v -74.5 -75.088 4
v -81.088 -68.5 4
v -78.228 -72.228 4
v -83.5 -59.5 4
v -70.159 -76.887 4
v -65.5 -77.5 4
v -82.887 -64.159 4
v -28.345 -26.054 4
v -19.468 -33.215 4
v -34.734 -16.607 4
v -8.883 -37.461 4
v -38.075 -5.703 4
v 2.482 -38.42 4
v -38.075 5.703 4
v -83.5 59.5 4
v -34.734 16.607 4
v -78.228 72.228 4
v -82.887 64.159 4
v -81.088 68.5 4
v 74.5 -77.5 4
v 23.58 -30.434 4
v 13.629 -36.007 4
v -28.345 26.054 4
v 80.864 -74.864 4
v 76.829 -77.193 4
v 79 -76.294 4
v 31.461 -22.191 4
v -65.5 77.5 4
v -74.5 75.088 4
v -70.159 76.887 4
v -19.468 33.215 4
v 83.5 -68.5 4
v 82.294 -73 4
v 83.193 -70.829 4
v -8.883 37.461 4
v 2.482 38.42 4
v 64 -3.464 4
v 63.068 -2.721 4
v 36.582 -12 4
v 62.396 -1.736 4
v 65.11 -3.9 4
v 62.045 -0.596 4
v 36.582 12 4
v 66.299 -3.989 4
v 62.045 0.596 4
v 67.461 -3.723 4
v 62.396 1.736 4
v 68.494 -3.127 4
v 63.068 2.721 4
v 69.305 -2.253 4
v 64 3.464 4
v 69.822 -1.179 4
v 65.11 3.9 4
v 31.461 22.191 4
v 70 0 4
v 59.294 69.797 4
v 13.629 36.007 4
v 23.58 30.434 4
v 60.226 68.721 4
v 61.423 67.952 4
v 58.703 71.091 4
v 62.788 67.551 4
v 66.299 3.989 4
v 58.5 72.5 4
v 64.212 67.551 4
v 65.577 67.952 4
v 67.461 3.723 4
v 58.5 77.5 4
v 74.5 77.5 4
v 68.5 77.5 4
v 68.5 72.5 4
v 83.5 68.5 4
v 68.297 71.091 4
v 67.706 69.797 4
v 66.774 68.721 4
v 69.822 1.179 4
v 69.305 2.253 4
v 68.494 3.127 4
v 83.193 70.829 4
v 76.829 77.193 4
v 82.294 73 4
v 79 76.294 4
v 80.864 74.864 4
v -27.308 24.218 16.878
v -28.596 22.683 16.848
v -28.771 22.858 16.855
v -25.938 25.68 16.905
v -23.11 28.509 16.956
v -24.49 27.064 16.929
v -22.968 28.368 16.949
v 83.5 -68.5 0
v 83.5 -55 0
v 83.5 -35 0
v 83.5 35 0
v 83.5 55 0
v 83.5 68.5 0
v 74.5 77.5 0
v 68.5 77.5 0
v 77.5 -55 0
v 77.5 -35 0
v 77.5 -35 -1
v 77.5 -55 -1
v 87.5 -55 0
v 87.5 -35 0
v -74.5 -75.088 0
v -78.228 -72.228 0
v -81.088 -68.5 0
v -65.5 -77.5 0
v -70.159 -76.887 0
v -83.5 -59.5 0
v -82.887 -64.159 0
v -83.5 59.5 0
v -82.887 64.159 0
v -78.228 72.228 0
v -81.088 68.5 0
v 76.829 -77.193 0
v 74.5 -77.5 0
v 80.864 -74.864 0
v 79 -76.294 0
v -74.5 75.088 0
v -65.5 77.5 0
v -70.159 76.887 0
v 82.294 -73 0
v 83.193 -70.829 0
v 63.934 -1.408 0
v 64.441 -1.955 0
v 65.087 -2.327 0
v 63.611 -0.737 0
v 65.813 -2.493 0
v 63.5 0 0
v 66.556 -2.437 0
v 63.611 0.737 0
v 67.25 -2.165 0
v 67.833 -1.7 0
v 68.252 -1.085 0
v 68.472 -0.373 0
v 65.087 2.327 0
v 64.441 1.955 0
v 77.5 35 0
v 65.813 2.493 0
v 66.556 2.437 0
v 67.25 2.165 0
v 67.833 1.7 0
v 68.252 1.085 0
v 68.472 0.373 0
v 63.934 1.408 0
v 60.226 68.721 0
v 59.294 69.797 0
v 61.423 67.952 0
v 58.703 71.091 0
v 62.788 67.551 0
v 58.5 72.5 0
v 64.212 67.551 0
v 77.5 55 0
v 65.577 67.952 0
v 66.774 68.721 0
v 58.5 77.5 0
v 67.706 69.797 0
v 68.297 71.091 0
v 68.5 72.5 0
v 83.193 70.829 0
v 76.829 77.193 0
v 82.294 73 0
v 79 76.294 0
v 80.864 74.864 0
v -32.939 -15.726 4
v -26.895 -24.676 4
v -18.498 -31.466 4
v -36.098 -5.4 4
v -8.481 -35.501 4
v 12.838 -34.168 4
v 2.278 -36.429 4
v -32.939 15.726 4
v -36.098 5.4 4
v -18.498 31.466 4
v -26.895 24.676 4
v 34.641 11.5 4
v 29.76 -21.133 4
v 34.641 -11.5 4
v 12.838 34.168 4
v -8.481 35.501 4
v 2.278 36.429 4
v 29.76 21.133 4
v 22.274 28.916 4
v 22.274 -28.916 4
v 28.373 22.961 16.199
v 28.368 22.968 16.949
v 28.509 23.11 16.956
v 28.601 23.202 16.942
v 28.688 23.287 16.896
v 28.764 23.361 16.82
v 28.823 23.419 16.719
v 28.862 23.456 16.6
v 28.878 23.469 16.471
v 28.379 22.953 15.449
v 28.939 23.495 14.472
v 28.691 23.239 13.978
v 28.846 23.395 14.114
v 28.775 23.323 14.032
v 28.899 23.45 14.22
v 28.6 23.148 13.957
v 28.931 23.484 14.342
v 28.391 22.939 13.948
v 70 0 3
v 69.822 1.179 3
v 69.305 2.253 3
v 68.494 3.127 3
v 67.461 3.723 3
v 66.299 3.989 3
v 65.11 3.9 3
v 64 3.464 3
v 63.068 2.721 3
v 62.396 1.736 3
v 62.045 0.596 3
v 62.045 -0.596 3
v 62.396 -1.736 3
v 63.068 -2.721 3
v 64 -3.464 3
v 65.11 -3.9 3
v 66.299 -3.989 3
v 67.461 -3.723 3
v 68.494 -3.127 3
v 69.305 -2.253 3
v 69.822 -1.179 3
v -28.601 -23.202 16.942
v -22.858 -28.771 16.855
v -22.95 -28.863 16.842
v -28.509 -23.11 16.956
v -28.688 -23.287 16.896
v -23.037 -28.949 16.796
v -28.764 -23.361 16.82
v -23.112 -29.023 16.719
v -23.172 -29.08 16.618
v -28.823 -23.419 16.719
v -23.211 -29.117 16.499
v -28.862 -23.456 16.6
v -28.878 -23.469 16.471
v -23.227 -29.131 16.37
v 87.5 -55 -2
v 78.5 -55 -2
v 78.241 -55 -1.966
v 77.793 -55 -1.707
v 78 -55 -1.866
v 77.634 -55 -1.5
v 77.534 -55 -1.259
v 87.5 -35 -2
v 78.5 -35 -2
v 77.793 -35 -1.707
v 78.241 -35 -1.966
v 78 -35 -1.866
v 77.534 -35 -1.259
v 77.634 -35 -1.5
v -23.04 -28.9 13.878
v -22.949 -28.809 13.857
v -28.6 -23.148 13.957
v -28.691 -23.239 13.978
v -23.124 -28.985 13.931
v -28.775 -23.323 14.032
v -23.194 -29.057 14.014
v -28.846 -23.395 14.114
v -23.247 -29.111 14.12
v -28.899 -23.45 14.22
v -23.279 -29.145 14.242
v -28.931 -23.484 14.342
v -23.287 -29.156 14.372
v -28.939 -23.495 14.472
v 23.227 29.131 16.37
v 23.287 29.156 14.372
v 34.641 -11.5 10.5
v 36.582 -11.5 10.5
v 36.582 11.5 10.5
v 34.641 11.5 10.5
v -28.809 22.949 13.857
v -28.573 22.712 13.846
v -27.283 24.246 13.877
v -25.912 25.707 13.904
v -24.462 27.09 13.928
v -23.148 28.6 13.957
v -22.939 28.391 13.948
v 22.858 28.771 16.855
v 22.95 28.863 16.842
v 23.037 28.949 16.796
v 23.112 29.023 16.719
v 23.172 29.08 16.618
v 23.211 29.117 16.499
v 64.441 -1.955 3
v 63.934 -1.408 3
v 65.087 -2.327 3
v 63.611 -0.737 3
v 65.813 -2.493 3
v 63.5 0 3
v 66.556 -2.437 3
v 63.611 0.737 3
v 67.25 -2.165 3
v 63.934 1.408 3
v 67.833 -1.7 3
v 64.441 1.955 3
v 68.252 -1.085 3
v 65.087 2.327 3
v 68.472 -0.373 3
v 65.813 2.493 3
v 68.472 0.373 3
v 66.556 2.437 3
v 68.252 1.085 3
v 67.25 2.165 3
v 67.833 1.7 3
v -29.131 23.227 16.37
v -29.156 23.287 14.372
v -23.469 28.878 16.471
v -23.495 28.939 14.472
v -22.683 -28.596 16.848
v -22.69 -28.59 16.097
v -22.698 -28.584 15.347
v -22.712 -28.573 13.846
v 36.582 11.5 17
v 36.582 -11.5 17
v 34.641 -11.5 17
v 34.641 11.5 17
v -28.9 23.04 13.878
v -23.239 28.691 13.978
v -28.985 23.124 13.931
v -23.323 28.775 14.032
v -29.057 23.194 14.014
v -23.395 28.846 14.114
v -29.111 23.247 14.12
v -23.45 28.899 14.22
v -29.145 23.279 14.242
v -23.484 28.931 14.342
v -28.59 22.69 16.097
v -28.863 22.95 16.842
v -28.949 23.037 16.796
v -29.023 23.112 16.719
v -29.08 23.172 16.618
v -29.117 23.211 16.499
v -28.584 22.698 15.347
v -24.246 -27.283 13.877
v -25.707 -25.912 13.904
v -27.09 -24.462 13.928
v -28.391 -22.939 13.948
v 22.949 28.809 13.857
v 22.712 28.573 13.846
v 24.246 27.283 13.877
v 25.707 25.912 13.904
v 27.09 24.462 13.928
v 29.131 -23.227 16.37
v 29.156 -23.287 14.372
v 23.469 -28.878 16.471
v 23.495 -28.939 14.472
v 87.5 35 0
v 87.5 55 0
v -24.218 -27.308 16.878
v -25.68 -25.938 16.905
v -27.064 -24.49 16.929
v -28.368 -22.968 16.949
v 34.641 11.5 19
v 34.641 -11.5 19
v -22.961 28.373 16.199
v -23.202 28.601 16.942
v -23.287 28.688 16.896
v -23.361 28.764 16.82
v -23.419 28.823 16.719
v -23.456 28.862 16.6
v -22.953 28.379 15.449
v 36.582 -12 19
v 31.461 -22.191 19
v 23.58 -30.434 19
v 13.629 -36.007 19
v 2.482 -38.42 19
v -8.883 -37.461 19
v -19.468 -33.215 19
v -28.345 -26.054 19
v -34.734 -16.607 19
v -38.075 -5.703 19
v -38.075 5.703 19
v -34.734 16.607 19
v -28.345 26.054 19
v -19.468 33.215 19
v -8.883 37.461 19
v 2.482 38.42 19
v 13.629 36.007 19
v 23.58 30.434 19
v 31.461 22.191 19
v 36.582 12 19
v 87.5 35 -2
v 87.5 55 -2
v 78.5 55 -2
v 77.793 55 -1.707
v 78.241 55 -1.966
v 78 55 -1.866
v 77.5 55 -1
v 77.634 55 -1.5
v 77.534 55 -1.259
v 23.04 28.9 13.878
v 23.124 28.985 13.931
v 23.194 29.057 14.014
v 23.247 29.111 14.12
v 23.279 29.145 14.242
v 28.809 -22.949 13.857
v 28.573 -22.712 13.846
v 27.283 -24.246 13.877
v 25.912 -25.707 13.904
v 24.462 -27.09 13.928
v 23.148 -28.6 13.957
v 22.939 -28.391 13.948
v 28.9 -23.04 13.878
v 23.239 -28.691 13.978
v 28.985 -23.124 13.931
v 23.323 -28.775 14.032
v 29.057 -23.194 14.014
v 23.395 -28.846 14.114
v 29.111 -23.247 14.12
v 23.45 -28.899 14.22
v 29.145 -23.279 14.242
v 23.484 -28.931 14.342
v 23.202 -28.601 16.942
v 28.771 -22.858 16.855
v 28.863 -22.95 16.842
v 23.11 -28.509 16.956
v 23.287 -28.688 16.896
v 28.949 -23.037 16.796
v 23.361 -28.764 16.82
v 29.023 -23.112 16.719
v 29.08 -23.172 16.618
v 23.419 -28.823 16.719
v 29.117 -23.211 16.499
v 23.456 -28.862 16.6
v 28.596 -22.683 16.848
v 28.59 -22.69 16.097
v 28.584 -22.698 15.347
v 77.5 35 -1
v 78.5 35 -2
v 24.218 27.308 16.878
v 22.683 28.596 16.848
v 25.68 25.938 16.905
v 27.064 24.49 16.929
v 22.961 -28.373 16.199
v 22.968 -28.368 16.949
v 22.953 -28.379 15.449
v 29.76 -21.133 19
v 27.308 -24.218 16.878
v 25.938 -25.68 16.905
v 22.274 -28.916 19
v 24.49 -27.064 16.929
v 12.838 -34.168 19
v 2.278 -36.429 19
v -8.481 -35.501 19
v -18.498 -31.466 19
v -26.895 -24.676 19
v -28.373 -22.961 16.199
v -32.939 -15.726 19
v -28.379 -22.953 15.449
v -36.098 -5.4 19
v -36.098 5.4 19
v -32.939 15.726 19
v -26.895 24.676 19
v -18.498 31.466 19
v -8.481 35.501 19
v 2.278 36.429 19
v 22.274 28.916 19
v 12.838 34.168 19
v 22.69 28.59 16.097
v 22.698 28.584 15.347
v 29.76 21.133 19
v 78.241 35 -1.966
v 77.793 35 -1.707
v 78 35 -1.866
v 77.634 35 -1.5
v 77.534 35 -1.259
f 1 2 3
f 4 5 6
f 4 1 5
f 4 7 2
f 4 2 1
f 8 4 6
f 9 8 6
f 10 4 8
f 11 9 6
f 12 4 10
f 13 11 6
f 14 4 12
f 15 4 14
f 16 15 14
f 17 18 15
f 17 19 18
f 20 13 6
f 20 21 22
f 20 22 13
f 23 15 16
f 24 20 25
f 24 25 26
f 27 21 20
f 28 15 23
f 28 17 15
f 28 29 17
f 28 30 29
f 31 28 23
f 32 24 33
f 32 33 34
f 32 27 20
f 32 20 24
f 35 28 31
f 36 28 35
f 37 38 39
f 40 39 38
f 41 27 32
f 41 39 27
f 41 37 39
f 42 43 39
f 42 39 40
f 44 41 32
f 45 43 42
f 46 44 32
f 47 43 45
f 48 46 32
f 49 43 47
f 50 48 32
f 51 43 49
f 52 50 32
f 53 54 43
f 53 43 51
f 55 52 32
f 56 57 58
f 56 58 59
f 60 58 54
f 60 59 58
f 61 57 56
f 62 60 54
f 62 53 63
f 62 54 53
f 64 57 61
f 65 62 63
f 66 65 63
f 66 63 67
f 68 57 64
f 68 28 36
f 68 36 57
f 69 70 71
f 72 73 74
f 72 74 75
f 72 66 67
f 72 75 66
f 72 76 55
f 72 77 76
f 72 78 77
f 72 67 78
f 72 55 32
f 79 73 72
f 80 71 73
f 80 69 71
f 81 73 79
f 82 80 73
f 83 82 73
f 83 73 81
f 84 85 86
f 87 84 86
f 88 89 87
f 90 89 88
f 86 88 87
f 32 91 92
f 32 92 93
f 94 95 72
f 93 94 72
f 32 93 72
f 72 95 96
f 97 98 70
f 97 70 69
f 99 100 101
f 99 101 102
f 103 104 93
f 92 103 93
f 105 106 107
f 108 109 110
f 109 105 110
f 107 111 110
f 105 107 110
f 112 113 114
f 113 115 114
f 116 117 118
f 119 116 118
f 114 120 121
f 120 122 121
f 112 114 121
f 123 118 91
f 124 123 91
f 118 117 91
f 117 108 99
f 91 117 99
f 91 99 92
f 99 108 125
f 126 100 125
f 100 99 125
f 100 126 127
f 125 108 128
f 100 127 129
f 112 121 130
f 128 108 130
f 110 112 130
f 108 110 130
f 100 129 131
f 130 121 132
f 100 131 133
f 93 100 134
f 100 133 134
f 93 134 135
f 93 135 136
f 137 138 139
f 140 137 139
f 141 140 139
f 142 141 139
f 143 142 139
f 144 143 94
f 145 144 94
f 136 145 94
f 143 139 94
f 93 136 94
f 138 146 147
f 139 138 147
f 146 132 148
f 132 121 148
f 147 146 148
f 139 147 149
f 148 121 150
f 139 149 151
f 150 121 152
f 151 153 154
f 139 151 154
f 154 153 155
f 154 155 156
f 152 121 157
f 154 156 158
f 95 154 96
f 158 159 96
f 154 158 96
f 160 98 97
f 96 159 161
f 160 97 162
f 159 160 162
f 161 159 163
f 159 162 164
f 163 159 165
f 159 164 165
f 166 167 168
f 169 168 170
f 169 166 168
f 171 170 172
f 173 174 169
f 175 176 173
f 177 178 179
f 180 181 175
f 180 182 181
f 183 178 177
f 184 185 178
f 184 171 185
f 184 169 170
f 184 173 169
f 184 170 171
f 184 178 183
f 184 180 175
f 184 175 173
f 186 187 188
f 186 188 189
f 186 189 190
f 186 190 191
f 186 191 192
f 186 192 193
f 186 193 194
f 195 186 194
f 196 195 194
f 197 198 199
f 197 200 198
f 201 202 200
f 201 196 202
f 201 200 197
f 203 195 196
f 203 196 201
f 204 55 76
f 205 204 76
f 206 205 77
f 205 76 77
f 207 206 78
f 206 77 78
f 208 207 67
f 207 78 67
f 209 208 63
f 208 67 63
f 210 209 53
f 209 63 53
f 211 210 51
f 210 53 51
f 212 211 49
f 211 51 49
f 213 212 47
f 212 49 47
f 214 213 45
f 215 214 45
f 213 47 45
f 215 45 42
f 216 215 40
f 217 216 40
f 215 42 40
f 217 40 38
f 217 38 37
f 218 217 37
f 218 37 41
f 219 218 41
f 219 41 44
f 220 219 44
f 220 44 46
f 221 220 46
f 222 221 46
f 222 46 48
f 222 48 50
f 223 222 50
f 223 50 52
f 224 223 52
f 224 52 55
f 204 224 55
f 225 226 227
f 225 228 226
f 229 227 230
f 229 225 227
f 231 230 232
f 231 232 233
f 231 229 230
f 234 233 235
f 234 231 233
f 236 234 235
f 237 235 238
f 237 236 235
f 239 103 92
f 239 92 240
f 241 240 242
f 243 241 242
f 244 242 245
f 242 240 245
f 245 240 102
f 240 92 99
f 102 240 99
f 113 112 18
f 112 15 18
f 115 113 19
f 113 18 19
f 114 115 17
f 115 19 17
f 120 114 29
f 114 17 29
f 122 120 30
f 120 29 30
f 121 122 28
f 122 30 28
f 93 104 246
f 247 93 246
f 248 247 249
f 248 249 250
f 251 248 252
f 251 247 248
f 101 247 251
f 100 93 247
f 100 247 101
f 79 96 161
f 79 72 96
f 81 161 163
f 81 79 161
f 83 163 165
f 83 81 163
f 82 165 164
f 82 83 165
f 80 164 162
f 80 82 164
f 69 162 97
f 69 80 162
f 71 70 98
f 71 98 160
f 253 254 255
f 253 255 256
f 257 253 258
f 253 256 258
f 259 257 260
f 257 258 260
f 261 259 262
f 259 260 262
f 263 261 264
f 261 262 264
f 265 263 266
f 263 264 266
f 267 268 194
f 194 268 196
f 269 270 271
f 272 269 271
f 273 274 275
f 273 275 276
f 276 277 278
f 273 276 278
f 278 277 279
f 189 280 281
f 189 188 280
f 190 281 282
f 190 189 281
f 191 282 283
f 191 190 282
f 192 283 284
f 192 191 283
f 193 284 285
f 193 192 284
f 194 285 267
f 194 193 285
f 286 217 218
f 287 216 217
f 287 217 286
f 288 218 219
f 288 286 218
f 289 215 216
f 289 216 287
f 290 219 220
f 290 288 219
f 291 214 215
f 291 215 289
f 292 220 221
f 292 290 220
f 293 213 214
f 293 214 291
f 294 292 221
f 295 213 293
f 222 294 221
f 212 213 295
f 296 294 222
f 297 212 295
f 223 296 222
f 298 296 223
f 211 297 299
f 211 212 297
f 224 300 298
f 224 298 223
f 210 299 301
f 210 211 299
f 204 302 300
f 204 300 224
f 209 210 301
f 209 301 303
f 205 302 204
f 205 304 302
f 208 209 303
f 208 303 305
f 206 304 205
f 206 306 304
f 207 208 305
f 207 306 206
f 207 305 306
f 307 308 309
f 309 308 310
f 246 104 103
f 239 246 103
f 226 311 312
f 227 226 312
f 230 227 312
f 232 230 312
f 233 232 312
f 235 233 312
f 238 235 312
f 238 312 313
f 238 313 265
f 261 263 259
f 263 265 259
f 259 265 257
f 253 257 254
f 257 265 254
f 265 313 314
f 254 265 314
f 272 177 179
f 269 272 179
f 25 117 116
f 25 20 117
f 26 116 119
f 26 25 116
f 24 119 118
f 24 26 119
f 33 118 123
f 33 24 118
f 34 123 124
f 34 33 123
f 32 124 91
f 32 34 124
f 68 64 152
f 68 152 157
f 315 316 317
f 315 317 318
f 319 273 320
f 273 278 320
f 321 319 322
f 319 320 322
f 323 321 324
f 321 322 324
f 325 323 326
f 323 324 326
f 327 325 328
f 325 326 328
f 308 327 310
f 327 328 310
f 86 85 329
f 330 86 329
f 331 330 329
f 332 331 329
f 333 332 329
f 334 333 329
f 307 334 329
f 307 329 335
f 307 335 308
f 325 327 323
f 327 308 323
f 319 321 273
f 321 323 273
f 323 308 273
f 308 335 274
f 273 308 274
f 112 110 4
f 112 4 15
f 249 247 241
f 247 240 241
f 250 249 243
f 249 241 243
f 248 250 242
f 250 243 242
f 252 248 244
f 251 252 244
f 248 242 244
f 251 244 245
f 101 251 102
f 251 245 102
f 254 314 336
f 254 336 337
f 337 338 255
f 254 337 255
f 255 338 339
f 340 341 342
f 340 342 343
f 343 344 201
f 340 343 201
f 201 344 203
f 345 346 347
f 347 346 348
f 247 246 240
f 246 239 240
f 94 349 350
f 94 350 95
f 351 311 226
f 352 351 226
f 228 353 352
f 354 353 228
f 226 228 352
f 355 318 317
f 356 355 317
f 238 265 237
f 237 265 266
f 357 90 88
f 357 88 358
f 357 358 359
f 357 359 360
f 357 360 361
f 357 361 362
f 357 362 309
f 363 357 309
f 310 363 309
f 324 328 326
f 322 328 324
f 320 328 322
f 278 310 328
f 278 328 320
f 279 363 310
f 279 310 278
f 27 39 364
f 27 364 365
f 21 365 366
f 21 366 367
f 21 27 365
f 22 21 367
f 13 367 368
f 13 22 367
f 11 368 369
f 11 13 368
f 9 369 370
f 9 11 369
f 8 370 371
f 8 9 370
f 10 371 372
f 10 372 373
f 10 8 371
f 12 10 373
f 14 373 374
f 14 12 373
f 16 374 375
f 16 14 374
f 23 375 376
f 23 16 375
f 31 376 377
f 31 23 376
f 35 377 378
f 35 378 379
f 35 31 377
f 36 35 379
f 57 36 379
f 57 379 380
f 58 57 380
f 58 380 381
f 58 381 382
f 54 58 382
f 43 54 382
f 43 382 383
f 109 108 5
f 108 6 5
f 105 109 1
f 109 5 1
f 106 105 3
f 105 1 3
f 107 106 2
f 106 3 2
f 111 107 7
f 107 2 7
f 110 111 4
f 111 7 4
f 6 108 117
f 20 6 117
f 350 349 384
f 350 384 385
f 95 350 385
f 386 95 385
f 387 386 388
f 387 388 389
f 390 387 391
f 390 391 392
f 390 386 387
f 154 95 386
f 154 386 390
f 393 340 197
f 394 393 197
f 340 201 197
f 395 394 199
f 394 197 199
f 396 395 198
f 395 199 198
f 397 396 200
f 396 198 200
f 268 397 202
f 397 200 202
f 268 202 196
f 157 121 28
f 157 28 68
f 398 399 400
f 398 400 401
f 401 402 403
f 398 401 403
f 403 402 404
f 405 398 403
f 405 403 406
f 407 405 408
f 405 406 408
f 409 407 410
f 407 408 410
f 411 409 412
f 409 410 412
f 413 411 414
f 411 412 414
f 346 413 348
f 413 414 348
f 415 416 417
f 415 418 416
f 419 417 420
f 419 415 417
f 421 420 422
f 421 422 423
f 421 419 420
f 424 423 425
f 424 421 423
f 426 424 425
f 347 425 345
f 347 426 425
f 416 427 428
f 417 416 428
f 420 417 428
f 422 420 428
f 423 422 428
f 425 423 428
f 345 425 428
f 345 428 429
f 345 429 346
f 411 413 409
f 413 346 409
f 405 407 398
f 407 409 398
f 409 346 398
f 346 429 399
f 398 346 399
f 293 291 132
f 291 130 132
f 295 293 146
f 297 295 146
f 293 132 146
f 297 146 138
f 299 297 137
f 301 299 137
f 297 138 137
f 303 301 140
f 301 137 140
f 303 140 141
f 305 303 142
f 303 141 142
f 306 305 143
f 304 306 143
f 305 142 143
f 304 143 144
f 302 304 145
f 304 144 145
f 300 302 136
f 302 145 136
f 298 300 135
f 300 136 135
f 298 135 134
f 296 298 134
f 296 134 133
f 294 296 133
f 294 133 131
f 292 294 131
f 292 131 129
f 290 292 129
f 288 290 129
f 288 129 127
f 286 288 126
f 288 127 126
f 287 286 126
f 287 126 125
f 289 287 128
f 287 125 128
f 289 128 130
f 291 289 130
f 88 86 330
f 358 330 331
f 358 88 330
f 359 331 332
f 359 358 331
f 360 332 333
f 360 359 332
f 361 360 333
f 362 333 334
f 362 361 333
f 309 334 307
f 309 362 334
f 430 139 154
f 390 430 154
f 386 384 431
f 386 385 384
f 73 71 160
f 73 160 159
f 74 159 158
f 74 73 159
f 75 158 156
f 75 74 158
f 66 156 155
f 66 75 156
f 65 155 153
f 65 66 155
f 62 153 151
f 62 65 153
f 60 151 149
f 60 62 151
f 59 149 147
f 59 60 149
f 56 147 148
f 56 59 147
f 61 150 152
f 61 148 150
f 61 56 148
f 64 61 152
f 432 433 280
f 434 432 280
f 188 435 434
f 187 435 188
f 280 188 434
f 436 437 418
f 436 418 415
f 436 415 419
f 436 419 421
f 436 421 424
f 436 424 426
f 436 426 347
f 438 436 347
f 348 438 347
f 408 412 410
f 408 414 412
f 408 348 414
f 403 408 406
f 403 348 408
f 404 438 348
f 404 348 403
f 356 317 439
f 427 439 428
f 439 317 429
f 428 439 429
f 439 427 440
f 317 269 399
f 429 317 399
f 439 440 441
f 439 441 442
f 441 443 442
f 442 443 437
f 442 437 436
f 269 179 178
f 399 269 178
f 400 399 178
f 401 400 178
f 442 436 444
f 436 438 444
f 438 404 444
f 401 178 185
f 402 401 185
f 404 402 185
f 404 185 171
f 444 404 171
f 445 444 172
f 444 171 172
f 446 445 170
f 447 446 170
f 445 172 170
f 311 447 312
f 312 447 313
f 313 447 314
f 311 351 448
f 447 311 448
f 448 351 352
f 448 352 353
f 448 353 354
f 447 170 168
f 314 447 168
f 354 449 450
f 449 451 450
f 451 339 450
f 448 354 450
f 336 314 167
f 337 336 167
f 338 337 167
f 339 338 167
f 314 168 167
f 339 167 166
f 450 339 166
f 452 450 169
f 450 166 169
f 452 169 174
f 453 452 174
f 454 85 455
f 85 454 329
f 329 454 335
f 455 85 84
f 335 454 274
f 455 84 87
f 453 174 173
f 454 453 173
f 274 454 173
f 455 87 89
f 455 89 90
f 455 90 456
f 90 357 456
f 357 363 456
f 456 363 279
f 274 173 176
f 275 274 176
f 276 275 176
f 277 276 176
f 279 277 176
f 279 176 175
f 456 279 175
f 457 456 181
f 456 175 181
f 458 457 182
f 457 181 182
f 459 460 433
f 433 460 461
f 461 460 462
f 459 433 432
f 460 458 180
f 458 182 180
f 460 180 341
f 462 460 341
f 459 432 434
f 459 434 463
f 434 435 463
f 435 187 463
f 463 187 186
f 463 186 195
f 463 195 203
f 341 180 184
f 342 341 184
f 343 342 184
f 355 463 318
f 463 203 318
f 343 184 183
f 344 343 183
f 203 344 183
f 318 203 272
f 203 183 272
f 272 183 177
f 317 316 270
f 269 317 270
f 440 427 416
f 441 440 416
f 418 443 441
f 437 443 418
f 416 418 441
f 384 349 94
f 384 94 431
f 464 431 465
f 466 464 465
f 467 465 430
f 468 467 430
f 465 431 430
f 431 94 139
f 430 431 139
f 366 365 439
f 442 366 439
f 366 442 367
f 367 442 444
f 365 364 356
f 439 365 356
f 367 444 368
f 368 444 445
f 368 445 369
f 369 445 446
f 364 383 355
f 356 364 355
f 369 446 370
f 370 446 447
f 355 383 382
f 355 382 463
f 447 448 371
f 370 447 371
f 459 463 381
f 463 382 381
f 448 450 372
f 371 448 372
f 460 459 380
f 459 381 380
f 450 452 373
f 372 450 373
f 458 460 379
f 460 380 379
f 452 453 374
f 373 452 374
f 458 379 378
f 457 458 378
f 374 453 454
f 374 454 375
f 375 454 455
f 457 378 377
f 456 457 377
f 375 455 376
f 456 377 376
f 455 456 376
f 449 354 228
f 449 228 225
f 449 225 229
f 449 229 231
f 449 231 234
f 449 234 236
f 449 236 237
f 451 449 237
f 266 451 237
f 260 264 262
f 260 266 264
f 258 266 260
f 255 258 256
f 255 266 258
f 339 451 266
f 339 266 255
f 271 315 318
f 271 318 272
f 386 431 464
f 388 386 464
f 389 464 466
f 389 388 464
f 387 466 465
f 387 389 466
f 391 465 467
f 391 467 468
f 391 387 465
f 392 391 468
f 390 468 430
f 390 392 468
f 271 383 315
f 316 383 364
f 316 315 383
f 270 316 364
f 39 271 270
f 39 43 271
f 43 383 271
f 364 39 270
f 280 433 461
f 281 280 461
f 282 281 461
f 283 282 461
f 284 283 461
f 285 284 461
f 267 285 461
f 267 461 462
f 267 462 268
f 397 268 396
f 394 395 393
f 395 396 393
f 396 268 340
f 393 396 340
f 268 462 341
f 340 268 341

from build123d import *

# Parameters (mm, degrees)
SKETCH_1_W                       = 167
SKETCH_1_H                       = 155
EXTRUDE_1_DEPTH                  = 4
FILLET_1_R                       = 9
FILLET_2_R                       = 18
CUT_EXTRUDE_1_REACH              = 115.993
HOLE_WIZARD_1_D                  = 5
HOLE_WIZARD_1_CBORE_D            = 8
HOLE_WIZARD_1_CBORE_DEPTH        = 1
EXTRUDE_3_DEPTH                  = 15
CUT_EXTRUDE_2_REACH              = 146.177
SKETCH_13_W                      = 6.5
SKETCH_13_H                      = 23
SKETCH_15_W                      = 8
SKETCH_15_H                      = 3
CUT_EXTRUDE_3_DEPTH              = 2.5
FILLET_3_R                       = 0.5
PATTERN_CIRCULAR_1_COUNT         = 4
FILLET_3_OF_PATTERN_CIRCULAR_1_R = 0.5
SKETCH_18_W                      = 10
SKETCH_18_H                      = 20
EXTRUDE_4_DEPTH                  = 2
FILLET_4_R                       = 1
FILLET_4_OF_MIRROR_1_R           = 1


with BuildPart() as part:
    # ｽｹｯﾁ1 → ﾎﾞｽ - 押し出し1 (new body)
    with BuildSketch(Plane.XY):
        Rectangle(SKETCH_1_W, SKETCH_1_H)
    extrude(amount=EXTRUDE_1_DEPTH)

    # ﾌｨﾚｯﾄ1
    fillet_1_edges = [part.edges().sort_by_distance(p)[0] for p in [
        (83.5, -77.5, 2),
        (83.5, 77.5, 2),
    ]]
    fillet(fillet_1_edges, radius=FILLET_1_R)

    # ﾌｨﾚｯﾄ2
    fillet_2_edges = [part.edges().sort_by_distance(p)[0] for p in [
        (-83.5, -77.5, 2),
        (-83.5, 77.5, 2),
    ]]
    fillet(fillet_2_edges, radius=FILLET_2_R)

    # ｽｹｯﾁ2 → ｶｯﾄ - 押し出し1 (cut, up to next)
    with BuildSketch(Plane.XY.offset(4), mode=Mode.PRIVATE) as cut_extrude_1_sk1:
        with BuildLine():
            Line((58.5, 77.5), (68.5, 77.5))
            Line((68.5, 77.5), (68.5, 72.5))
            ThreePointArc((68.5, 72.5), (63.5, 67.5), (58.5, 72.5))
            Line((58.5, 72.5), (58.5, 77.5))
        make_face()
    cut_extrude_1_tool1 = extrude(cut_extrude_1_sk1.sketch, amount=-CUT_EXTRUDE_1_REACH, mode=Mode.PRIVATE) & part.part
    add(cut_extrude_1_tool1.solids().sort_by_distance((63.5, 72.966749, 4))[0], mode=Mode.SUBTRACT)

    # 穴1 (through all)
    with Locations(Plane.XY.offset(4)):
        with Locations((66, 0)):
            CounterBoreHole(HOLE_WIZARD_1_D / 2, HOLE_WIZARD_1_CBORE_D / 2, HOLE_WIZARD_1_CBORE_DEPTH)

    # ｽｹｯﾁ11 → ﾎﾞｽ - 押し出し3 (add)
    with BuildSketch(Plane.XY.offset(4)):
        with BuildLine():
            Line((36.582099448, 12), (36.582099448, -12))
            ThreePointArc((36.582099448, -12), (-38.5, 0), (36.582099448, 12))
        make_face()
        with BuildLine():
            Line((34.641016151, 11.5), (34.641016151, -11.5))
            ThreePointArc((34.641016151, -11.5), (-36.5, 0), (34.641016151, 11.5))
        make_face(mode=Mode.SUBTRACT)
    extrude(amount=EXTRUDE_3_DEPTH)

    # ｽｹｯﾁ13 → ｶｯﾄ - 押し出し2 (cut, up to next)
    with BuildSketch(Plane(origin=(36.582099448, 0, 0), x_dir=(0, 0, -1), z_dir=(1, 0, 0)), mode=Mode.PRIVATE) as cut_extrude_2_sk1:
        with Locations((-13.75, 0)):
            Rectangle(SKETCH_13_W, SKETCH_13_H)
    cut_extrude_2_tool1 = extrude(cut_extrude_2_sk1.sketch, amount=-CUT_EXTRUDE_2_REACH, mode=Mode.PRIVATE) & part.part
    add(cut_extrude_2_tool1.solids().sort_by_distance((36.582099, 0, 13.75))[0], mode=Mode.SUBTRACT)

    # ｽｹｯﾁ15 → ｶｯﾄ - 押し出し3 (cut)
    with BuildSketch(Plane(origin=(-24.72592031, 24.748737342, 1.062480514), x_dir=(0.7076465964640425, 0.7064548659887622, 0.012562517011201728), z_dir=(-0.7064548659887622, 0.7071067811865462, 0.030356586119027387))):
        with Locations((0, -14.290598152)):
            Rectangle(SKETCH_15_W, SKETCH_15_H)
    cut_extrude_3 = extrude(amount=CUT_EXTRUDE_3_DEPTH, mode=Mode.SUBTRACT)

    # ﾌｨﾚｯﾄ3
    fillet_3_edges = [part.edges().sort_by_distance(p)[0] for p in [
        (-26.293687817, 26.037155642, 16.920446126),
        (-26.331375368, 26.1282254, 13.922065571),
    ]]
    fillet(fillet_3_edges, radius=FILLET_3_R)

    # 円形ﾊﾟﾀｰﾝ1: ｶｯﾄ - 押し出し3 ×4 about axis
    pattern_circular_1_axis = Axis((0, 0, 0), (0, 0, 1))
    for i in range(1, PATTERN_CIRCULAR_1_COUNT):
        add(cut_extrude_3.rotate(pattern_circular_1_axis, i * 360 / PATTERN_CIRCULAR_1_COUNT), mode=Mode.SUBTRACT)

    # ﾌｨﾚｯﾄ3 of 円形ﾊﾟﾀｰﾝ1
    fillet_3_of_pattern_circular_1_edges = [part.edges().sort_by_distance(p)[0] for p in [
        (-26.037155642, -26.293687817, 16.920446126),
        (-26.1282254, -26.331375368, 13.922065571),
        (26.293687817, -26.037155642, 16.920446126),
        (26.331375368, -26.1282254, 13.922065571),
        (26.037155642, 26.293687817, 16.920446126),
        (26.1282254, 26.331375368, 13.922065571),
    ]]
    fillet(fillet_3_of_pattern_circular_1_edges, radius=FILLET_3_OF_PATTERN_CIRCULAR_1_R)

    # ｽｹｯﾁ18 → ﾎﾞｽ - 押し出し4 (add)
    with BuildSketch(Plane(origin=(0, 0, 0), x_dir=(-1, 0, 0), z_dir=(0, 0, -1))):
        with Locations((-82.5, 45)):
            Rectangle(SKETCH_18_W, SKETCH_18_H)
    extrude_4 = extrude(amount=EXTRUDE_4_DEPTH)

    # ﾌｨﾚｯﾄ4
    fillet_4_edges = [part.edges().sort_by_distance(p)[0] for p in [
        (77.5, 45, -2),
    ]]
    fillet(fillet_4_edges, radius=FILLET_4_R)

    # ﾐﾗｰ1: ﾎﾞｽ - 押し出し4 across plane
    add(extrude_4.mirror(Plane.ZX))

    # ﾌｨﾚｯﾄ4 of ﾐﾗｰ1
    fillet_4_of_mirror_1_edges = [part.edges().sort_by_distance(p)[0] for p in [
        (77.5, -45, -2),
    ]]
    fillet(fillet_4_of_mirror_1_edges, radius=FILLET_4_OF_MIRROR_1_R)


solid = part.part
